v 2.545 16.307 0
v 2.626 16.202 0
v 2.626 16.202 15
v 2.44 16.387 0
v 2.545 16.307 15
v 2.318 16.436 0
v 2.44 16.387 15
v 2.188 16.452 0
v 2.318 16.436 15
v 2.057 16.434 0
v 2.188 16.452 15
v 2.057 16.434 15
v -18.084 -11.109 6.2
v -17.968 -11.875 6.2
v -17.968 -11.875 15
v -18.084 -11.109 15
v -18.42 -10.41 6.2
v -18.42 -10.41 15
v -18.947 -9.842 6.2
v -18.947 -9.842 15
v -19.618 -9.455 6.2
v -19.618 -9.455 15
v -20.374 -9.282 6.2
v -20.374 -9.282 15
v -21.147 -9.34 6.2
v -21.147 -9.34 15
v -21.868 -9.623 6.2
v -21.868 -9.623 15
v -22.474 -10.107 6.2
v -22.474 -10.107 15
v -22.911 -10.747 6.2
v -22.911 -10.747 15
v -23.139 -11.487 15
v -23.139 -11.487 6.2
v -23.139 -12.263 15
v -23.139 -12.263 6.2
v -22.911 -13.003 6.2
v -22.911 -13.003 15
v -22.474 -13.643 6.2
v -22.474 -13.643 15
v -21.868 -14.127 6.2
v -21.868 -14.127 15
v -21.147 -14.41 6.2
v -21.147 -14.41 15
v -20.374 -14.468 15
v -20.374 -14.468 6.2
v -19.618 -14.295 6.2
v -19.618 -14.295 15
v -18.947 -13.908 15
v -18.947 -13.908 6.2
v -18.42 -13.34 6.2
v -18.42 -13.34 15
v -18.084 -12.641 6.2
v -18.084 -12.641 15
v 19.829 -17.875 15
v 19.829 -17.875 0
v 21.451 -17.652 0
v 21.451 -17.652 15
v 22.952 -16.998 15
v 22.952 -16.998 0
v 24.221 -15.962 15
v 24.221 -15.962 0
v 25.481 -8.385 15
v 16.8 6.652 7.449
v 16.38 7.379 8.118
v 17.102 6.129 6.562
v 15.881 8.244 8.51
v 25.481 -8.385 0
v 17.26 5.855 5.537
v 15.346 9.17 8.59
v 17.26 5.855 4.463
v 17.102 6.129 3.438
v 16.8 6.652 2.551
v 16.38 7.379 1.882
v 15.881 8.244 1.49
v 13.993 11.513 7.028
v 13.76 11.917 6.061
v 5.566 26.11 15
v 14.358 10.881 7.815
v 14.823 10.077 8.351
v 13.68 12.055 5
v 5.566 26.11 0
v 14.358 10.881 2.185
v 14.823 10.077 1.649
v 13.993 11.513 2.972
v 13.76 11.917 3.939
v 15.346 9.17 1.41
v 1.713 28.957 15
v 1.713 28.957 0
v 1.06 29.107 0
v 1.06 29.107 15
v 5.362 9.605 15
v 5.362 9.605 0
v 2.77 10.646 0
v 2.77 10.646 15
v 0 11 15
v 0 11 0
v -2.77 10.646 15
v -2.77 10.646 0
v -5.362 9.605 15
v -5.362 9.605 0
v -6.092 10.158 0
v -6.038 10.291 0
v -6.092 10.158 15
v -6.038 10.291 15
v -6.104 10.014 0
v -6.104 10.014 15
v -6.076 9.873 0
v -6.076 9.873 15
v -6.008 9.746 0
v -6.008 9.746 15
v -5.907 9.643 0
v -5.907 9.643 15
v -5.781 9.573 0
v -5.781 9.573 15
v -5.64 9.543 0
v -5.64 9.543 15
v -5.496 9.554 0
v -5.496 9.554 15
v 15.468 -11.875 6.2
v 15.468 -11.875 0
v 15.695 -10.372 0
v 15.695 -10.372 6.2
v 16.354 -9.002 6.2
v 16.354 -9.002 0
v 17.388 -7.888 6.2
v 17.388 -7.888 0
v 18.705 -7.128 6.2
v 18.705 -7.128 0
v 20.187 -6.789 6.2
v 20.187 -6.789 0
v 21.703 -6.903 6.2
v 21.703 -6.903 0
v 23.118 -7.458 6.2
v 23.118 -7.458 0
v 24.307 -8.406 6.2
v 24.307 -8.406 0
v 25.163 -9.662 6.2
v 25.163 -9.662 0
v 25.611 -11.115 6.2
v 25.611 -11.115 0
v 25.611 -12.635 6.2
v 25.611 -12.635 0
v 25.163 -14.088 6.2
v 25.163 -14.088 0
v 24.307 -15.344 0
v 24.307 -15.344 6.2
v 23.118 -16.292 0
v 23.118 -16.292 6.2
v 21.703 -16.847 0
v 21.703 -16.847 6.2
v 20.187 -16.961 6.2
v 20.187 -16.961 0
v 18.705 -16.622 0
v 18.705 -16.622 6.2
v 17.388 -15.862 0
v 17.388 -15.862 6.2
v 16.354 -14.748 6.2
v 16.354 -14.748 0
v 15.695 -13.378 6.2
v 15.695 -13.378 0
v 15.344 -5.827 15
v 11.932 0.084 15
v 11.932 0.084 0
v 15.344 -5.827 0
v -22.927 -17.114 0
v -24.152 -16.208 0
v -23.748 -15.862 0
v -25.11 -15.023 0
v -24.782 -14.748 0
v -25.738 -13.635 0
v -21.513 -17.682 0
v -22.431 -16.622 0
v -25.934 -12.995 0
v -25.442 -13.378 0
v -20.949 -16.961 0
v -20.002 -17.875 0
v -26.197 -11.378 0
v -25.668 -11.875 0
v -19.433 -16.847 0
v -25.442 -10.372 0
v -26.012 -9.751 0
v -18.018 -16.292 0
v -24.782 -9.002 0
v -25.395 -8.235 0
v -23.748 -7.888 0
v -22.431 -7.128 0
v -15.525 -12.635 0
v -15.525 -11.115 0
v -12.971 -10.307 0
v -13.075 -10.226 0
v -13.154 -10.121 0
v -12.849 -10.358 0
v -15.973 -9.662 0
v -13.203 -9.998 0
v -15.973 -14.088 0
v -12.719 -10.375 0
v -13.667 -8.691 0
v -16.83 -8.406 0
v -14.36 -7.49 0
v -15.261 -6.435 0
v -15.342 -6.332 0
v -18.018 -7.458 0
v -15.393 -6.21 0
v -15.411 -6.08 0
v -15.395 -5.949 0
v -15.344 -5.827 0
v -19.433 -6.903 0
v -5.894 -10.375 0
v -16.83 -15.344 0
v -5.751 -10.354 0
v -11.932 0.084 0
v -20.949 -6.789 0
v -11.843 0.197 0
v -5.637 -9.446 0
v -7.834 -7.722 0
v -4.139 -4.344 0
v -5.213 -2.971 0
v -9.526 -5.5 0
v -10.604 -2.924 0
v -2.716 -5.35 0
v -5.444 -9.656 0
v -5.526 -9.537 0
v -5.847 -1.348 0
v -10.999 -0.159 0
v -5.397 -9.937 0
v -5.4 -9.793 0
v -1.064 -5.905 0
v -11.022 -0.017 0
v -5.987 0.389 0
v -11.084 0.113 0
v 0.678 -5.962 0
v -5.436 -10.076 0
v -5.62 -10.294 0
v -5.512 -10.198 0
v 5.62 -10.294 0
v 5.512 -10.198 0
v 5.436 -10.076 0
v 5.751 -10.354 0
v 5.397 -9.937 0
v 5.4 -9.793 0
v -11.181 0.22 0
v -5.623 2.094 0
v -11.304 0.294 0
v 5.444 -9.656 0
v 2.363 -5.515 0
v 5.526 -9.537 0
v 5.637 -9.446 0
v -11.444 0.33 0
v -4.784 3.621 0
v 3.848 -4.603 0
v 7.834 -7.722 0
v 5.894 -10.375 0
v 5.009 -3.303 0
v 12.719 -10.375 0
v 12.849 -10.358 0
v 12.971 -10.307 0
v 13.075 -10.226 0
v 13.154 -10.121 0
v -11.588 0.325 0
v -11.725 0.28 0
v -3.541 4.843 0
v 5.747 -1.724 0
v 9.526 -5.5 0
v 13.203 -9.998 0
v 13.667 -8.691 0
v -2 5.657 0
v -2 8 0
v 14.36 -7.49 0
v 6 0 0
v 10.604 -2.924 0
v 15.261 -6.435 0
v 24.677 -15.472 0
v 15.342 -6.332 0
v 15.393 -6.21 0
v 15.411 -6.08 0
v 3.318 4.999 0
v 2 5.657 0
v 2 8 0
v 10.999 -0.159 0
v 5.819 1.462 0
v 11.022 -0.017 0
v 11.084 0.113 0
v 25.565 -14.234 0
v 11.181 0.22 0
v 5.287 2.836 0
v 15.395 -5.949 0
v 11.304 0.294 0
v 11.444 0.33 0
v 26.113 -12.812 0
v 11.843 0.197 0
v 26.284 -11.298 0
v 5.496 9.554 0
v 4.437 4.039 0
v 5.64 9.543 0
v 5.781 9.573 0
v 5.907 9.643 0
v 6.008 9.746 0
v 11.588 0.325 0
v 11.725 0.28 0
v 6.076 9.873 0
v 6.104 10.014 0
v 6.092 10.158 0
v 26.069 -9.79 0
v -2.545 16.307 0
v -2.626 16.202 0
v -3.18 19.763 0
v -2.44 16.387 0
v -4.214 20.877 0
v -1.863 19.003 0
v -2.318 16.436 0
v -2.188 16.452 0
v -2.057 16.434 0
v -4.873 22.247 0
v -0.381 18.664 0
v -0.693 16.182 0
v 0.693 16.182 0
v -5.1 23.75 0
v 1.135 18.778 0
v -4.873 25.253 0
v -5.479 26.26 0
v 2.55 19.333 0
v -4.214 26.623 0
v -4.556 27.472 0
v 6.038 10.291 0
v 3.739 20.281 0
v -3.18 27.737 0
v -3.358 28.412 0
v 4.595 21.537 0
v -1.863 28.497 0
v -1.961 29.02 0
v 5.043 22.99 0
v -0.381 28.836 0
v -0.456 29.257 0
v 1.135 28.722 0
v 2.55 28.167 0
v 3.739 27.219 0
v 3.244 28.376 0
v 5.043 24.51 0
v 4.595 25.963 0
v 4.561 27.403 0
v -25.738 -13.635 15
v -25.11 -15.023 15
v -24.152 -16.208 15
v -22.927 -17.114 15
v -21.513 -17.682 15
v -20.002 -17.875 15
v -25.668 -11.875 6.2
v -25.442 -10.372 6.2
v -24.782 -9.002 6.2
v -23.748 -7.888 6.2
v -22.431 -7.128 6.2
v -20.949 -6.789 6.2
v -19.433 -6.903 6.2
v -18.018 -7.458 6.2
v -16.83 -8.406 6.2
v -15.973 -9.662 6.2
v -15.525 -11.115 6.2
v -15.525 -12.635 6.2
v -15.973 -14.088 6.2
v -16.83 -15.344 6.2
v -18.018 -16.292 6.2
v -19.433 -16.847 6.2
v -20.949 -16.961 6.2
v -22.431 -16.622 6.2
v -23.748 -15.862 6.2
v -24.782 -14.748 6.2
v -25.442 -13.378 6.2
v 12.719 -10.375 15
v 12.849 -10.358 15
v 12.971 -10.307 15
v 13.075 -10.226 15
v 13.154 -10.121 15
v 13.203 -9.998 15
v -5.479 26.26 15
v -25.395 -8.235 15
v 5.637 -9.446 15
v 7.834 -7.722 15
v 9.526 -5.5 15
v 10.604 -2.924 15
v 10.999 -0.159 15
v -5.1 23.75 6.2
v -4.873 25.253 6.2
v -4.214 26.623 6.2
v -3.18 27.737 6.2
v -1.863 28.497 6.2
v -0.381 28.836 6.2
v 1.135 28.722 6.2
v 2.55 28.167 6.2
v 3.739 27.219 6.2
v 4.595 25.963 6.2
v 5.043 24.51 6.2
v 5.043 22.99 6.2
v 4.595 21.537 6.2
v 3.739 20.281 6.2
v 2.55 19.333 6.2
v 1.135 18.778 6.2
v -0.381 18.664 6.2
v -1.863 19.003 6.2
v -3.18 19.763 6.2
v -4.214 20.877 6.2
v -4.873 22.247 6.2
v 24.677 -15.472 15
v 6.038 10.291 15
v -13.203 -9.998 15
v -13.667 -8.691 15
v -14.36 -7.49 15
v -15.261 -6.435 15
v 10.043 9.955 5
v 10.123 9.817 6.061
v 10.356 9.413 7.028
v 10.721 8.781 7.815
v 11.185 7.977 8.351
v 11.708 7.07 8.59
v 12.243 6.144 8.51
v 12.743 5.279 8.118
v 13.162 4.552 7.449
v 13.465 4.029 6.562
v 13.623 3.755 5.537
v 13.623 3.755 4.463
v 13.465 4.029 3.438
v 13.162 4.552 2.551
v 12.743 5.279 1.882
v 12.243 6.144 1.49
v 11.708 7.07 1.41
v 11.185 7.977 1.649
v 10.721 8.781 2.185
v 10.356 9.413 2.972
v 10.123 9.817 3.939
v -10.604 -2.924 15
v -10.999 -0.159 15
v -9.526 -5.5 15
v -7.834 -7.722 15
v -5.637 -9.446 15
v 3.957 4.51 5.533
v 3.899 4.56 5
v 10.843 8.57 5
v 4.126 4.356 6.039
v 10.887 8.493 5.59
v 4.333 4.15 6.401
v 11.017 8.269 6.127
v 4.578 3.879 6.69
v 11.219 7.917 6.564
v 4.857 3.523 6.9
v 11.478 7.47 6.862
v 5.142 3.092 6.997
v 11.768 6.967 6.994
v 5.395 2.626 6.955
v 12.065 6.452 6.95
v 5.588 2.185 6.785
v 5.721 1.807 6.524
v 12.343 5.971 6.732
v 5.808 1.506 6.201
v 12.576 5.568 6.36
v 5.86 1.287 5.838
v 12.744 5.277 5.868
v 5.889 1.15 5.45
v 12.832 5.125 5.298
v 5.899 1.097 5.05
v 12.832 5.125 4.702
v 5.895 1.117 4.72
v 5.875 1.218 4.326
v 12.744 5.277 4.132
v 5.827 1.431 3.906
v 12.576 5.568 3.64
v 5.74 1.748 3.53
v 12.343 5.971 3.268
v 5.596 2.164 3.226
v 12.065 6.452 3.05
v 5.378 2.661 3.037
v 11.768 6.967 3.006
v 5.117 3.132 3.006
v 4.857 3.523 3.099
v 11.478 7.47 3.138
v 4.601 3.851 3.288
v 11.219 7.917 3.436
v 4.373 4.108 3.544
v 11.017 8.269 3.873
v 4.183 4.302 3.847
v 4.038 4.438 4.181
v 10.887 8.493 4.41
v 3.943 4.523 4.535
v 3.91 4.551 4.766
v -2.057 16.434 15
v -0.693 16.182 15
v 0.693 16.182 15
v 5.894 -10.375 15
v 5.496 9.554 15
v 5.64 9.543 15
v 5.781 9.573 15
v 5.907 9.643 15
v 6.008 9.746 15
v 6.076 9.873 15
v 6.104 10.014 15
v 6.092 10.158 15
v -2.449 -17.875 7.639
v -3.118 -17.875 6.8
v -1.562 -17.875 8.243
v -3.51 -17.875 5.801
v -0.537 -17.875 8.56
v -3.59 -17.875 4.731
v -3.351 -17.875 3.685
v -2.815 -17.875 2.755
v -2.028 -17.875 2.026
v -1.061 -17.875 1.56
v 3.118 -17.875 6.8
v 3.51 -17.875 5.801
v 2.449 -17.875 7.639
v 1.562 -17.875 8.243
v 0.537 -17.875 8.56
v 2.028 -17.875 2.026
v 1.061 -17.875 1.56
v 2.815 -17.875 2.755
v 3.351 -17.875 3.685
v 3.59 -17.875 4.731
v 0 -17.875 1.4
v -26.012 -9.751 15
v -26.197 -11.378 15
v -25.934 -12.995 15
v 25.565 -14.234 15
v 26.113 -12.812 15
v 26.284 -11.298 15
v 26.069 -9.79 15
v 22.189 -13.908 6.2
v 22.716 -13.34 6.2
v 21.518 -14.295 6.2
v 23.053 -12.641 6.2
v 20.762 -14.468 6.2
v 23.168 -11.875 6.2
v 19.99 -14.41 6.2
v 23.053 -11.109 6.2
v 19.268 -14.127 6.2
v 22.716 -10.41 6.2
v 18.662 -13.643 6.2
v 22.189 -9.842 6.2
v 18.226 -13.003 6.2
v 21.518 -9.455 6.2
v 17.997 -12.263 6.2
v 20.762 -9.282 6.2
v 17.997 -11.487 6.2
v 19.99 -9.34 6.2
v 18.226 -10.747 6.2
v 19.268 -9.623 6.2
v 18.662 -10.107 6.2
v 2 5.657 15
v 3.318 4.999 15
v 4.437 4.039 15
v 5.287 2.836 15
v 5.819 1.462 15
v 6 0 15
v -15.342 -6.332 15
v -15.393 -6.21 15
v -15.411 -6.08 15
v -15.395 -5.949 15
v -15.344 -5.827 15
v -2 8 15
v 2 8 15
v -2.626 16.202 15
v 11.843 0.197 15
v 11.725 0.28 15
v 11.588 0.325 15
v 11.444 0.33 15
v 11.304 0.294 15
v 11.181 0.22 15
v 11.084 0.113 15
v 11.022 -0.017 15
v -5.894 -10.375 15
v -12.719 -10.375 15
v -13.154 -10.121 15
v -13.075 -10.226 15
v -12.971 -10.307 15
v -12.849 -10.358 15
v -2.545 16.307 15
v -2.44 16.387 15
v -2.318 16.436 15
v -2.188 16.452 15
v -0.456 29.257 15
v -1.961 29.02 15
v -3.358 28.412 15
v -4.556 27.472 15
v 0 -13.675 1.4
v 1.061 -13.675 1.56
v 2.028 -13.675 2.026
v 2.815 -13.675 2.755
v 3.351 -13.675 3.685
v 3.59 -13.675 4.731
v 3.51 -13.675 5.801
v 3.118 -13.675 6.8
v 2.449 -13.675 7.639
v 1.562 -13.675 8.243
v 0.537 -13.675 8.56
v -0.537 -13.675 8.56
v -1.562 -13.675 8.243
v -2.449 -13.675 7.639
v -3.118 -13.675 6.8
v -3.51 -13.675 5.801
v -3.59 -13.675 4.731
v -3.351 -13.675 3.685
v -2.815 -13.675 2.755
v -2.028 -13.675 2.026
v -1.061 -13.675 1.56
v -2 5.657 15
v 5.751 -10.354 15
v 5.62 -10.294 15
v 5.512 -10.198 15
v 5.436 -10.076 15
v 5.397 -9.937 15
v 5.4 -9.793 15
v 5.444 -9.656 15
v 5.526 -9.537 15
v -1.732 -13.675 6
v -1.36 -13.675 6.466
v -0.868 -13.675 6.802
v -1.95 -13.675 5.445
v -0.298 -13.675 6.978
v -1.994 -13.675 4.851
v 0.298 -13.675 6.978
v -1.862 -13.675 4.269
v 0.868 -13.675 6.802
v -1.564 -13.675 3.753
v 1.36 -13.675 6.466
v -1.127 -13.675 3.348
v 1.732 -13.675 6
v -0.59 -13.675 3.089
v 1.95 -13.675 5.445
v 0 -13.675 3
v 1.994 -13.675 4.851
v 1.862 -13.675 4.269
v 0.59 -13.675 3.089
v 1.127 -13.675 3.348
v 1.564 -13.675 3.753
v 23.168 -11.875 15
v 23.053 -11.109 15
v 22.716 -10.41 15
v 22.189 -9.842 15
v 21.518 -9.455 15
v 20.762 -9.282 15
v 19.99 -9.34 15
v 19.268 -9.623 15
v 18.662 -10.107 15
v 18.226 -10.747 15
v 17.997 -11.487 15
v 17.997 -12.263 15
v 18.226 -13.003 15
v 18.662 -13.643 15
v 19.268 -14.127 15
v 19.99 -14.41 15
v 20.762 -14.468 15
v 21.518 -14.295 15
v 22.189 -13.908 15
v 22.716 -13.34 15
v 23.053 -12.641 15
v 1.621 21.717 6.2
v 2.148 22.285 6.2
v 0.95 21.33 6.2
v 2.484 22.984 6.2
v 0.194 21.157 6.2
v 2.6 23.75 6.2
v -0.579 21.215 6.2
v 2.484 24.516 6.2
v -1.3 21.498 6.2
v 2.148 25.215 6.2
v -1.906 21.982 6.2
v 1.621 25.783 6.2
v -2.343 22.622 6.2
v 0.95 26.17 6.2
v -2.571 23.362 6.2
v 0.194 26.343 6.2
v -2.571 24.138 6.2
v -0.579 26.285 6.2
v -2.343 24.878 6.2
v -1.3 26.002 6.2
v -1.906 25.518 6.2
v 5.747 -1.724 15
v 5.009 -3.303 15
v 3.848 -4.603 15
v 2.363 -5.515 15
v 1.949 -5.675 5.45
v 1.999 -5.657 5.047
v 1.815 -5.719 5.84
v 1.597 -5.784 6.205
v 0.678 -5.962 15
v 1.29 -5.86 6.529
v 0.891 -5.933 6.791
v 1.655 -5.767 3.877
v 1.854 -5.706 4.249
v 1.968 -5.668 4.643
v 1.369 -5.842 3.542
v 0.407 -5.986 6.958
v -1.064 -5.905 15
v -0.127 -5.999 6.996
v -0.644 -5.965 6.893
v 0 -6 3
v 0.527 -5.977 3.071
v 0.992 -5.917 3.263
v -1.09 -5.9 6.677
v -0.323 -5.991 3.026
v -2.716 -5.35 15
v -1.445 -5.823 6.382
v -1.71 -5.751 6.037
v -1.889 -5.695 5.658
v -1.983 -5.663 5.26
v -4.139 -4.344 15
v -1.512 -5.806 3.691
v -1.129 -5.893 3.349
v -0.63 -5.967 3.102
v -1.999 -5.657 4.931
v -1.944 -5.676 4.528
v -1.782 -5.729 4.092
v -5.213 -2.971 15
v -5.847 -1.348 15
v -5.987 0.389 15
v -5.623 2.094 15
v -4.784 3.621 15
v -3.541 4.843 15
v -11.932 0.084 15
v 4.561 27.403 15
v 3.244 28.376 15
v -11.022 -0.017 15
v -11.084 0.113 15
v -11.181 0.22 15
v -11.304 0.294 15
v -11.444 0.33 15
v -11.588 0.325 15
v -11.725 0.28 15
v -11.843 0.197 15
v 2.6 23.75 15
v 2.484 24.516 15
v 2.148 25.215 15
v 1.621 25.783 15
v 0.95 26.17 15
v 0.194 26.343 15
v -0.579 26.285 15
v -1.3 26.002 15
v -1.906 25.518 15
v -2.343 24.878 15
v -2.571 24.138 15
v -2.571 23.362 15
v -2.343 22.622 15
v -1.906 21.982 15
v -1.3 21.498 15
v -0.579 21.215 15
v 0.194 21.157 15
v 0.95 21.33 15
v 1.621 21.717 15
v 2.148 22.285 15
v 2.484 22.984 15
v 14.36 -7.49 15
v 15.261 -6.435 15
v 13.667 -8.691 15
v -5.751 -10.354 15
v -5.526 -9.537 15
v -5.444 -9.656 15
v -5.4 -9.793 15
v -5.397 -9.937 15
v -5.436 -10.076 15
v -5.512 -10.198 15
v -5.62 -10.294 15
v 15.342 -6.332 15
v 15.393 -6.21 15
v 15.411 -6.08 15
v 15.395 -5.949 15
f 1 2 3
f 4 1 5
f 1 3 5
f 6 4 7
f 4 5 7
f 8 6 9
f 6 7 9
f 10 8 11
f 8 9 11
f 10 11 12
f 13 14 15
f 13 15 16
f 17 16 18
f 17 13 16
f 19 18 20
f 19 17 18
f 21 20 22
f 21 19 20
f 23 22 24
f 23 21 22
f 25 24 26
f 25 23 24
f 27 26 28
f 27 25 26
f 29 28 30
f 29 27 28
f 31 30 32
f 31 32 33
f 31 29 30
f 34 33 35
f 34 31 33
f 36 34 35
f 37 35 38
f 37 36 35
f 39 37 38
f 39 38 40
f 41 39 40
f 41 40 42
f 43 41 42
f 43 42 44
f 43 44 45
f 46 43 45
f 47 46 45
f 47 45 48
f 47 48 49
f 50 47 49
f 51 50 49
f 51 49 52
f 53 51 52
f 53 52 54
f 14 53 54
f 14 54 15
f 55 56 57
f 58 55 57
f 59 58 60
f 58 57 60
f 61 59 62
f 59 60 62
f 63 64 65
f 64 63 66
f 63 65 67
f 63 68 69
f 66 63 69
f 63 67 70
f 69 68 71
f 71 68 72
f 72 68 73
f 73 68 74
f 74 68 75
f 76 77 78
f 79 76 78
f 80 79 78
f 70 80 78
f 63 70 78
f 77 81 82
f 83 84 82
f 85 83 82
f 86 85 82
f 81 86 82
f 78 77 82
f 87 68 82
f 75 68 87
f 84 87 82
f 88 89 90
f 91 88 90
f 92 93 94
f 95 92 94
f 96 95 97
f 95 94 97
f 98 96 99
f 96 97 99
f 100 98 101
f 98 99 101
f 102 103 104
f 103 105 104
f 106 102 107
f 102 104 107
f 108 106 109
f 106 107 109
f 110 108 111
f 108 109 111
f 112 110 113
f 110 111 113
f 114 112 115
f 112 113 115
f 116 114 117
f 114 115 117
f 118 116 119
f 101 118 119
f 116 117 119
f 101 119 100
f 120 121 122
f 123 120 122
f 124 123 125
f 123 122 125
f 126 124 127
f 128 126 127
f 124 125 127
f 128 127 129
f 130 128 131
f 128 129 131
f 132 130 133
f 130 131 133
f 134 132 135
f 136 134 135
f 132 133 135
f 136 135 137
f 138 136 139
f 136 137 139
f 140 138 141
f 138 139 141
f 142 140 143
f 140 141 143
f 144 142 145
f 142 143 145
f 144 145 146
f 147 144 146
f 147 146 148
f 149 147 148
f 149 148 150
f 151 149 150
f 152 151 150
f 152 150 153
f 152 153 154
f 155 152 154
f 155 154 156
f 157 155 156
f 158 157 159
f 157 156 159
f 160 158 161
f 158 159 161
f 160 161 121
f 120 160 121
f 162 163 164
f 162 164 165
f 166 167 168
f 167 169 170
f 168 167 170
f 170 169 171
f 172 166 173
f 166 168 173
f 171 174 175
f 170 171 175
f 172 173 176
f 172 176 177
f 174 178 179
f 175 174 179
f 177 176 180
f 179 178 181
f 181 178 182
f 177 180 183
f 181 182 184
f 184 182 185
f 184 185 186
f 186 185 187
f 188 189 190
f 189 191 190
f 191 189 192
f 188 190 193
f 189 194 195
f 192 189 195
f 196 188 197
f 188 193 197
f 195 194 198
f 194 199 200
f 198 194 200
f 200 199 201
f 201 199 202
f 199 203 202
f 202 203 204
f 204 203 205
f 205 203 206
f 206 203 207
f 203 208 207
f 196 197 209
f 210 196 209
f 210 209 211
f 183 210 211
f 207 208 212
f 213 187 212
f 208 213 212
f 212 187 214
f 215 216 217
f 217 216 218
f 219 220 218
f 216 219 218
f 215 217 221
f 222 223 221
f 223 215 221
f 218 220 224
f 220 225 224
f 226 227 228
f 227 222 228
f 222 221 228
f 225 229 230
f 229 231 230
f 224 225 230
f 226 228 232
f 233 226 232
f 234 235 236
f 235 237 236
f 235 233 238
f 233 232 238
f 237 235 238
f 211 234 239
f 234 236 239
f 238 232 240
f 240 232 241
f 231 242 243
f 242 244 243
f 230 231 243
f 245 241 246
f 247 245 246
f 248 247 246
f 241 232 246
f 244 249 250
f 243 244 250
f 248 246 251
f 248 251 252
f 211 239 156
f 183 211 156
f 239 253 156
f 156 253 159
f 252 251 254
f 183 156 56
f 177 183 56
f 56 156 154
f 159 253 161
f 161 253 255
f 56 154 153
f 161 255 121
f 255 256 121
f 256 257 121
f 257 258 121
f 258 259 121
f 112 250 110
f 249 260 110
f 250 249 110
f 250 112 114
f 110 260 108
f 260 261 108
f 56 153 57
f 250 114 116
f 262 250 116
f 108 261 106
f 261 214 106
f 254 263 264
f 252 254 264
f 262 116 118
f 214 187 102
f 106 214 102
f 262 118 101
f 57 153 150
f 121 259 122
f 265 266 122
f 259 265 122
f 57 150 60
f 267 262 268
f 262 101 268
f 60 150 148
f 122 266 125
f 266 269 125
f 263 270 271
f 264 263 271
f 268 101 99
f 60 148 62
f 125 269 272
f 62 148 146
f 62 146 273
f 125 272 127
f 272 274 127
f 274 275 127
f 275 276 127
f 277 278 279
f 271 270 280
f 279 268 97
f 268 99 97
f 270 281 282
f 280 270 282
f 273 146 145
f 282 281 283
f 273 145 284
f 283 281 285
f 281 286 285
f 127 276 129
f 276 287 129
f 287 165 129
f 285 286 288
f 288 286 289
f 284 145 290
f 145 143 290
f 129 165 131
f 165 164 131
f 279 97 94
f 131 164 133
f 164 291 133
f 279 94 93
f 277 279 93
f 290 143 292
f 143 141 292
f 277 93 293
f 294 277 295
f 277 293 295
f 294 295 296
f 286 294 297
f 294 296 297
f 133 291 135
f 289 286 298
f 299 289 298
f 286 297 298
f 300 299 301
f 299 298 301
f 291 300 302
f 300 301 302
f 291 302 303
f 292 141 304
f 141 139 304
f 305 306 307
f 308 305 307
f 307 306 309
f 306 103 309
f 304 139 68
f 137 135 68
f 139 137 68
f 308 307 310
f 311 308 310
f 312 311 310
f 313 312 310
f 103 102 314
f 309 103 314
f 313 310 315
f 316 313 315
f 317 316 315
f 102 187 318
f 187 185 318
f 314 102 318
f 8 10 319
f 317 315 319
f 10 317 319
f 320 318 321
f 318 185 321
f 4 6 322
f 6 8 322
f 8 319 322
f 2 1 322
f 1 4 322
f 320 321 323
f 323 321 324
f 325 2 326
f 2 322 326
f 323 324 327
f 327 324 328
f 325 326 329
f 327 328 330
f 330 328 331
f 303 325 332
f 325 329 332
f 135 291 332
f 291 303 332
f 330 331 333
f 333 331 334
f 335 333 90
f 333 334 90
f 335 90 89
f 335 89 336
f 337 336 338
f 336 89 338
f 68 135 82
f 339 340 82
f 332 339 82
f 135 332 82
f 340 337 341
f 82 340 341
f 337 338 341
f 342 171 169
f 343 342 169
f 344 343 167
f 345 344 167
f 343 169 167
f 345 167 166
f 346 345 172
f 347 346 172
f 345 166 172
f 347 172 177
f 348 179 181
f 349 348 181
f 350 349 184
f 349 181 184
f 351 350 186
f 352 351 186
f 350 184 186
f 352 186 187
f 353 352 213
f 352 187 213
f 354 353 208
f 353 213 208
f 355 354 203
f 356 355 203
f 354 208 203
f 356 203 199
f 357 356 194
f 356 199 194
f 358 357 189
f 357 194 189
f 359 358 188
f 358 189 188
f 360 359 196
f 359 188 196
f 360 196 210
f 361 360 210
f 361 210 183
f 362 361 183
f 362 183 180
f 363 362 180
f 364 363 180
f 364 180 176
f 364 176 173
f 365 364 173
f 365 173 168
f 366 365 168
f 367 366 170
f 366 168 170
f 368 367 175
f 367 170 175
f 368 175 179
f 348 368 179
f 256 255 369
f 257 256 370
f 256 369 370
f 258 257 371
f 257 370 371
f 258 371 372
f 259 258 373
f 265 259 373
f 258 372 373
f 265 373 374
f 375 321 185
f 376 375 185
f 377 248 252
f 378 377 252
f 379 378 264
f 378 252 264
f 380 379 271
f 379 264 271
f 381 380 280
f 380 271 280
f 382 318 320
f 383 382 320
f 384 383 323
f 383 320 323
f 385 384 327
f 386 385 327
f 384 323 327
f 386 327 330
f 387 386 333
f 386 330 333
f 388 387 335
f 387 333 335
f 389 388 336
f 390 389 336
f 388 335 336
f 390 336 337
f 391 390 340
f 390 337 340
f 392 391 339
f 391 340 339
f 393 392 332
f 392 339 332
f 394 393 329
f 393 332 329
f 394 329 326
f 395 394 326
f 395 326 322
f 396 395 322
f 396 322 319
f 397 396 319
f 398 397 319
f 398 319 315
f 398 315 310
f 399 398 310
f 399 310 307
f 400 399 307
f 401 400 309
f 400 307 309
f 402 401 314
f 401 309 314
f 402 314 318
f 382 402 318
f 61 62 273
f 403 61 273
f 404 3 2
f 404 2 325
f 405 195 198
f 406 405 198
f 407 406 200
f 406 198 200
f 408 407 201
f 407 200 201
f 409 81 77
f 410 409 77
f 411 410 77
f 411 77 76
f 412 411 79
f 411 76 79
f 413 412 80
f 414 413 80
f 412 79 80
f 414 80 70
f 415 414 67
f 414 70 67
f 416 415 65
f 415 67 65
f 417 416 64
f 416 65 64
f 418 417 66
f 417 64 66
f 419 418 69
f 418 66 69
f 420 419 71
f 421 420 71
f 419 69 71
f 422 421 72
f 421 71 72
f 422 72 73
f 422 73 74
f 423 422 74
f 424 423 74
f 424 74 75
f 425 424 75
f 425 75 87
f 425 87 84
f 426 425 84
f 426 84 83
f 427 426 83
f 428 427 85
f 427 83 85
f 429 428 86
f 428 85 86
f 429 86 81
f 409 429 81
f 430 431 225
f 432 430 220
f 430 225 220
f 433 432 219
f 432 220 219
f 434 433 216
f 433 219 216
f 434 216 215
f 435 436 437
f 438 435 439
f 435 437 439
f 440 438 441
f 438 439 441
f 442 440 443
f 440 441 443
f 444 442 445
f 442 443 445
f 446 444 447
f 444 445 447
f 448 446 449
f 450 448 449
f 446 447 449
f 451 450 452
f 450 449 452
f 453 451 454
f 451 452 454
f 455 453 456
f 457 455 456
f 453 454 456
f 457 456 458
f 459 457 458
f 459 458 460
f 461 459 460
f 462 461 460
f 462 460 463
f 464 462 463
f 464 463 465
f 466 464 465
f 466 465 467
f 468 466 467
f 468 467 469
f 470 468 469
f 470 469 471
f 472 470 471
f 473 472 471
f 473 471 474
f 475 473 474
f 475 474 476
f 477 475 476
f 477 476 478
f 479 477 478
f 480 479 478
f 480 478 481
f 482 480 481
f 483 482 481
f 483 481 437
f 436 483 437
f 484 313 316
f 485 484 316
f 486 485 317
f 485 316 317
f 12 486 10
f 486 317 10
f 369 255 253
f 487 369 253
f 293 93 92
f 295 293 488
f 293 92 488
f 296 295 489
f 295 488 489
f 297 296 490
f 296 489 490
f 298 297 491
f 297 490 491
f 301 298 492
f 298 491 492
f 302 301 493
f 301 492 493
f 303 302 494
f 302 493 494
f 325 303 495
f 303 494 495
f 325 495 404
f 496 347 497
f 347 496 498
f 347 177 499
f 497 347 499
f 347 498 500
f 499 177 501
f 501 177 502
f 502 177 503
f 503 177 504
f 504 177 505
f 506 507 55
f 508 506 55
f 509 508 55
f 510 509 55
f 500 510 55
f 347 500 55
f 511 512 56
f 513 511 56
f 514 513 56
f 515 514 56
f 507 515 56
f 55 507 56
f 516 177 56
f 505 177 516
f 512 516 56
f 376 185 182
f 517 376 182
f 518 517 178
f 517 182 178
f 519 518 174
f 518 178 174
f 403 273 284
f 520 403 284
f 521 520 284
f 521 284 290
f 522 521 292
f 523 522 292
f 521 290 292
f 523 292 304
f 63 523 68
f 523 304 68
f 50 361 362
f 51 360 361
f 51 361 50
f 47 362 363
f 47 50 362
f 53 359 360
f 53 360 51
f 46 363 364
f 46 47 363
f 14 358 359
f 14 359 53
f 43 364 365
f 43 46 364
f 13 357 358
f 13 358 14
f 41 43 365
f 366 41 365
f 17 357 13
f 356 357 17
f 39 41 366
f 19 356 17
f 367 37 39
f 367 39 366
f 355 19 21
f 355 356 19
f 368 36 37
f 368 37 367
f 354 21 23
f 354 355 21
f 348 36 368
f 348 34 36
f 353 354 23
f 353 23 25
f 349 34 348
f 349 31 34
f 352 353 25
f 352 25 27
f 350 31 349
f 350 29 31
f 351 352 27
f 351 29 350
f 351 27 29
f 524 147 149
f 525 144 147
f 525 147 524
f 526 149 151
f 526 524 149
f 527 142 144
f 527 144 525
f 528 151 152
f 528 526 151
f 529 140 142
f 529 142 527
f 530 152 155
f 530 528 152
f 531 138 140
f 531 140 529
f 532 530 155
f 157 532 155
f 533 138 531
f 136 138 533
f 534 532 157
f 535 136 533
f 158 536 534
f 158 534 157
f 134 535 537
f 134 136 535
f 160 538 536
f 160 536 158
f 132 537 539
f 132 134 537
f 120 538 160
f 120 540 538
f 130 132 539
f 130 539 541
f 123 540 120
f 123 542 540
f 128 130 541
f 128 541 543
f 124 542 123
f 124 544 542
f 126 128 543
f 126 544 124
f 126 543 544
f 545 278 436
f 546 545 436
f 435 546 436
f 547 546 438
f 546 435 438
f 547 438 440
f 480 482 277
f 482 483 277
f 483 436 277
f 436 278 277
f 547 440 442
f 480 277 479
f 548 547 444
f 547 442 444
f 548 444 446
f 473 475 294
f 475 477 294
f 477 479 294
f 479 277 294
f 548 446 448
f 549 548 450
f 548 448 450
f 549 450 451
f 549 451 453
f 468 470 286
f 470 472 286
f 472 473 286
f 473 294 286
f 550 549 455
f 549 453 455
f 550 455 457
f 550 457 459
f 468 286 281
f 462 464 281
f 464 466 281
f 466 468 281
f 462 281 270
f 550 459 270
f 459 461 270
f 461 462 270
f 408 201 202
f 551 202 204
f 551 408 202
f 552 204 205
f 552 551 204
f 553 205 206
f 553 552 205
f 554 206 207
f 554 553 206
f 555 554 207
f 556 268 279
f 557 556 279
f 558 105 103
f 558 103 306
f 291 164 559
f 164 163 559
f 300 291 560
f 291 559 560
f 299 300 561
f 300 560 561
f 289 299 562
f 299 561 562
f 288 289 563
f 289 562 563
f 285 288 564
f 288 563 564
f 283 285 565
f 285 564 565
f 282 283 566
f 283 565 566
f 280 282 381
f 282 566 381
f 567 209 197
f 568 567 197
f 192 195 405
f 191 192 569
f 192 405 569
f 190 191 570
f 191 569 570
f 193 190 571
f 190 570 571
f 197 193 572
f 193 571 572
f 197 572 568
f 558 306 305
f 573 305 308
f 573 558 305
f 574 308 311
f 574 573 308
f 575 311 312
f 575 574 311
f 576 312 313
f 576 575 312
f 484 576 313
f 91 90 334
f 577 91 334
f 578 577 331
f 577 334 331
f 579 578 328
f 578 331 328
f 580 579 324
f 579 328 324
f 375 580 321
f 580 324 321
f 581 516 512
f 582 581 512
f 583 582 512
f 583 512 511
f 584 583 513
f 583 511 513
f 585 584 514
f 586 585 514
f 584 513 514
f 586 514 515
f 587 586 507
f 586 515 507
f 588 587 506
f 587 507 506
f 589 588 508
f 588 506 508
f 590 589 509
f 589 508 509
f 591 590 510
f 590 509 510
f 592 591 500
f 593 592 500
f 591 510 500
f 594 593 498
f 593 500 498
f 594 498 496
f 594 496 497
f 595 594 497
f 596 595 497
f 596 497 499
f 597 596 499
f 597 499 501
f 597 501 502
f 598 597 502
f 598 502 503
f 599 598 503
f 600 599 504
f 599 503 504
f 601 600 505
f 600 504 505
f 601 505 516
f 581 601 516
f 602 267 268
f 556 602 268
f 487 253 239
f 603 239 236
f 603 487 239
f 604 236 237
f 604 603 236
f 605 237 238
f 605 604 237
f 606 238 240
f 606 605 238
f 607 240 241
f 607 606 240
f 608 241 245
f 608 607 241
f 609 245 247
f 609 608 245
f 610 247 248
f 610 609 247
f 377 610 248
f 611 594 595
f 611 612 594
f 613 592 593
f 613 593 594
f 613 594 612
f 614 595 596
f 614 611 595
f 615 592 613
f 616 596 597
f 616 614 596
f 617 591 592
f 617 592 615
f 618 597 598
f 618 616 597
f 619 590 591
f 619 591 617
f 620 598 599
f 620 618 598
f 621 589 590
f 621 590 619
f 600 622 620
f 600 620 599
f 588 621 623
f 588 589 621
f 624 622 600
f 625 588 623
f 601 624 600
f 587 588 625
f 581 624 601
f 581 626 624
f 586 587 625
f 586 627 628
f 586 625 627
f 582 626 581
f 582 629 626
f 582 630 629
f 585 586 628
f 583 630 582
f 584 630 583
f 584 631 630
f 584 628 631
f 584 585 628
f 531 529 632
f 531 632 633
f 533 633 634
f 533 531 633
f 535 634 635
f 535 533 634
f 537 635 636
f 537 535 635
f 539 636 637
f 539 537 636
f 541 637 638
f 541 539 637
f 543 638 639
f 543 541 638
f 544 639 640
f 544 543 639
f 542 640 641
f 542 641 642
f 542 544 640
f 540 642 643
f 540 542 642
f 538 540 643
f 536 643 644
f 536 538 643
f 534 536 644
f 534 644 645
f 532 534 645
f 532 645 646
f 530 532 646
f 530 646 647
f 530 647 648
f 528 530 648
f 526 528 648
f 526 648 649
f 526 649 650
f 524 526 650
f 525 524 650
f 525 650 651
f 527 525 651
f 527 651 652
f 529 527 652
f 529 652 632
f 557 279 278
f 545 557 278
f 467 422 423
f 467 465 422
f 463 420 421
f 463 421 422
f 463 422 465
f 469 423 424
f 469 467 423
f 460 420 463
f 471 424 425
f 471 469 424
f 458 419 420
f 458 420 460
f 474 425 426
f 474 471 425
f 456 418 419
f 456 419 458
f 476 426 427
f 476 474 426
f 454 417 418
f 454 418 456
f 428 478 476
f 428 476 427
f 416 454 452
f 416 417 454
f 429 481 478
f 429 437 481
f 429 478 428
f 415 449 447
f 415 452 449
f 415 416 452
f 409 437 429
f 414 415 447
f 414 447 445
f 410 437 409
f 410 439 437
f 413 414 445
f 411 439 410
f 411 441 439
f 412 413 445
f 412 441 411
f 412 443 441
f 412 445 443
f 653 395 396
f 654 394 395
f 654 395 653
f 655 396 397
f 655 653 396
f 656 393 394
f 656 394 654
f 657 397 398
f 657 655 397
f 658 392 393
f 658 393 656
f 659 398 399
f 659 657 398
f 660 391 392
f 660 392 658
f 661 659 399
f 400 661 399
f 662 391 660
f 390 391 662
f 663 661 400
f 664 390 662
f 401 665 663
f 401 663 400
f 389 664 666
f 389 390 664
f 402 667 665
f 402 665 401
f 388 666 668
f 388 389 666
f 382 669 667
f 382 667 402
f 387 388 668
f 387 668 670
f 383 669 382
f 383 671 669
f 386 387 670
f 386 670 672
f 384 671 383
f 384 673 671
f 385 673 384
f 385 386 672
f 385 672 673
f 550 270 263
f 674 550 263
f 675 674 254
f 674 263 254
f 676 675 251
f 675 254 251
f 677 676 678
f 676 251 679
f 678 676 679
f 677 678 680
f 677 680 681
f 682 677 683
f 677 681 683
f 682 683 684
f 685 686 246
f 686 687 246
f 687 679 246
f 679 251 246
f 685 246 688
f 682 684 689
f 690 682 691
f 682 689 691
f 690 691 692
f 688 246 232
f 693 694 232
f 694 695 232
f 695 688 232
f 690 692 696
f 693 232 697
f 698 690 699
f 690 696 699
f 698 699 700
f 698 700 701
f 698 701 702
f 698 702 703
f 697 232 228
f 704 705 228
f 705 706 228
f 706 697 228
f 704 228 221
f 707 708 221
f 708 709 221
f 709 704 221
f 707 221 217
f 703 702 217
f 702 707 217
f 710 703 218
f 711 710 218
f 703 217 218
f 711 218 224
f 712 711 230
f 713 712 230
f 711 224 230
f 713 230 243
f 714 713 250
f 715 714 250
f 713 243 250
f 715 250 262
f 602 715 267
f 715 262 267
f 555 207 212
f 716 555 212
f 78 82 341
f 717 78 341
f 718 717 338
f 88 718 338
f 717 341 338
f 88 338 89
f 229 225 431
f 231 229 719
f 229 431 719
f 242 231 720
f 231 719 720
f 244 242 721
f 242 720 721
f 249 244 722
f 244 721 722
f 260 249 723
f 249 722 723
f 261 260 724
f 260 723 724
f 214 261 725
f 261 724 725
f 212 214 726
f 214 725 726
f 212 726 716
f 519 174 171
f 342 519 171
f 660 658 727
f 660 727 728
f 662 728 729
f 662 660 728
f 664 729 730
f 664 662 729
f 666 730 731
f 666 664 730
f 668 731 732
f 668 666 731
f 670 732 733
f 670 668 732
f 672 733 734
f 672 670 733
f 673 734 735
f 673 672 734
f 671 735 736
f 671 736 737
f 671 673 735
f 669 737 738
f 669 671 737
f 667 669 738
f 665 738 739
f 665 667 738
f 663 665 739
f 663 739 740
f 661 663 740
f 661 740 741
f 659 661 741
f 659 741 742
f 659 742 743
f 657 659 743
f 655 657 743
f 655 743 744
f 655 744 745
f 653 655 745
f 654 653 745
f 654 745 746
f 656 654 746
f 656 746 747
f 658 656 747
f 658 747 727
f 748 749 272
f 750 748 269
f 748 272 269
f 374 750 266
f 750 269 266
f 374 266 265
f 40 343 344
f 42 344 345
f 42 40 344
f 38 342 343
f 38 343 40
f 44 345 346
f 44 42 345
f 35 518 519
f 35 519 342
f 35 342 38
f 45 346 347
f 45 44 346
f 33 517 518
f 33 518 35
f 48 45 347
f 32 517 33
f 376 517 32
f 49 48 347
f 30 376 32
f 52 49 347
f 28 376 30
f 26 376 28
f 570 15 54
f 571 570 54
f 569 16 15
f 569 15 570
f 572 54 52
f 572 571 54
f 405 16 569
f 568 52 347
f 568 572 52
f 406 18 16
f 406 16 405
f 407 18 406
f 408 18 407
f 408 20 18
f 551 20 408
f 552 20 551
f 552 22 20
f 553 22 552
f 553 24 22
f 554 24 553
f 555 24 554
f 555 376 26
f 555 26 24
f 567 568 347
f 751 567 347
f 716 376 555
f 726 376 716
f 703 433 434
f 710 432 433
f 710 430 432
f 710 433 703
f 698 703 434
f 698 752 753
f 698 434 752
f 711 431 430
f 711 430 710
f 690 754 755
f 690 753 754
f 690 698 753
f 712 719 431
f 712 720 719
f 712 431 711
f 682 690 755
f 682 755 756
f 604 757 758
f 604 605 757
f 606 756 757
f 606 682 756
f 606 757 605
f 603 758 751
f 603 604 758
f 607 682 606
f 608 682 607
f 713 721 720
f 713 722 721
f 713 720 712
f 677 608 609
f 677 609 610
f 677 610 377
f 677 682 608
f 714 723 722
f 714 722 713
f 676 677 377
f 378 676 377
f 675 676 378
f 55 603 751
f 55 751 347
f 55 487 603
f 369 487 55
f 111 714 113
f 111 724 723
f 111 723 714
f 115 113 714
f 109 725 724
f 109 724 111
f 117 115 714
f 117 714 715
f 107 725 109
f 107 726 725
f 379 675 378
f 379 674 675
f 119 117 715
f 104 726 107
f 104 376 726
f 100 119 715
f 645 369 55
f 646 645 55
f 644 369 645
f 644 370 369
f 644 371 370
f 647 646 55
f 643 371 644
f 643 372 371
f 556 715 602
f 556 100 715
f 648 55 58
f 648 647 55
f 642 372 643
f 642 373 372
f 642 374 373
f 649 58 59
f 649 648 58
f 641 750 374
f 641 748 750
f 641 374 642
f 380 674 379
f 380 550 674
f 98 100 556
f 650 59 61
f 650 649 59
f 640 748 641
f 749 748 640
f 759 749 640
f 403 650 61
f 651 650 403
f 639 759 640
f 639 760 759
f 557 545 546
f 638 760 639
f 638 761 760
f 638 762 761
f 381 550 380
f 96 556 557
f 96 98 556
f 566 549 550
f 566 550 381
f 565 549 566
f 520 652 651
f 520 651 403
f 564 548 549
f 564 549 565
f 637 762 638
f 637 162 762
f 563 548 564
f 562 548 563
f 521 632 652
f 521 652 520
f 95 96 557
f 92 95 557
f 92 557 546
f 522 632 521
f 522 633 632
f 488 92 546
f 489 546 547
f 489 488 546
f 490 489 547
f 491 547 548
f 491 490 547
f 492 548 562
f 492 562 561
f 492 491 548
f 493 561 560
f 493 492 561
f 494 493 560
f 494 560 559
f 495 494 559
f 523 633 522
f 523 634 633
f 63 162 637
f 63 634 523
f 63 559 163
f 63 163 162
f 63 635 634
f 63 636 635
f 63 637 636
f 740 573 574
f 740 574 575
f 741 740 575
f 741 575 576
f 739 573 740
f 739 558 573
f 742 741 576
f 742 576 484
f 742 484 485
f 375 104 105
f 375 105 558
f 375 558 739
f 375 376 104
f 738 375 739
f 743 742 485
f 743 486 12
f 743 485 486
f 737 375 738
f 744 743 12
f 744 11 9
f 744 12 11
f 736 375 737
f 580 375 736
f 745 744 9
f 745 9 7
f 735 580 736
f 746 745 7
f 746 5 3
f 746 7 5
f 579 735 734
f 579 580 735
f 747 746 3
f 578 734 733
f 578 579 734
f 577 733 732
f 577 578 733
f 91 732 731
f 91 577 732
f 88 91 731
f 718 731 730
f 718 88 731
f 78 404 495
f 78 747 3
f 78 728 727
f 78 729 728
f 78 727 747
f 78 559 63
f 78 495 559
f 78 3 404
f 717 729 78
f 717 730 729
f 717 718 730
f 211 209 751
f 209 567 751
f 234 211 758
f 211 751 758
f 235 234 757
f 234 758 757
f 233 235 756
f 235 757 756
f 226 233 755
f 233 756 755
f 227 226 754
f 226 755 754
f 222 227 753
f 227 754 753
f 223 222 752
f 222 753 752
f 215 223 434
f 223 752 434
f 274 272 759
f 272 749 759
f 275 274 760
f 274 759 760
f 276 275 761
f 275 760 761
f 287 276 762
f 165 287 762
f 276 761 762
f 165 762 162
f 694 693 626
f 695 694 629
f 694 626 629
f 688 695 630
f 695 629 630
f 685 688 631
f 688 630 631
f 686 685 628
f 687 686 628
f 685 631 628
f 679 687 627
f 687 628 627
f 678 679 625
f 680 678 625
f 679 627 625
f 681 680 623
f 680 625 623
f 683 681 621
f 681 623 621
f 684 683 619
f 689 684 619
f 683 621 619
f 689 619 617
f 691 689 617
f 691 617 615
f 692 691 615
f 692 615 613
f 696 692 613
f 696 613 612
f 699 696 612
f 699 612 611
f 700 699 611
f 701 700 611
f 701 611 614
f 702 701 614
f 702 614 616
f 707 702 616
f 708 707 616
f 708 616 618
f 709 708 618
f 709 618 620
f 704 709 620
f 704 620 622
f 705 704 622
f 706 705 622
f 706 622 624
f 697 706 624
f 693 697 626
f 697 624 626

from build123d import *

# Parameters (mm, degrees)
SKETCH_1_R               = 2.6
EXTRUDE_1_DEPTH          = 15
CUT_EXTRUDE_1_REACH      = 58.014
CUT_EXTRUDE_1_END_RADIUS = 6
SKETCH_3_R               = 2
SKETCH_4_R               = 3.6
CUT_EXTRUDE_2_DEPTH      = 4.2
SKETCH_6_R               = 5.1
CUT_EXTRUDE_4_DEPTH      = 6.2
CUT_EXTRUDE_5_REACH      = 53.779
CUT_EXTRUDE_5_END_RADIUS = 6
SKETCH_7_R               = 2
SKETCH_8_R               = 3.6
CUT_EXTRUDE_6_DEPTH      = 4.2
CUT_EXTRUDE_7_DEPTH      = 43.095434039
FILLET_1_R               = 0.5


with BuildPart() as part:
    # ｽｹｯﾁ1 → ﾎﾞｽ - 押し出し1 (new body)
    with BuildSketch(Plane.XY):
        with BuildLine():
            ThreePointArc((1.060449829, 29.107252287), (-2.678502383, 28.760723475), (-5.479274058, 26.259618943))
            Line((-5.479274058, 26.259618943), (-25.394531587, -8.234618943))
            ThreePointArc((-25.394531587, -8.234618943), (-26.160165812, -10.558527256), (-25.934363924, -12.994868595))
            Line((-25.934363924, -12.994868595), (-25.737844829, -13.635249652))
            ThreePointArc((-25.737844829, -13.635249652), (-23.56826597, -16.700012845), (-20.00186007, -17.875))
            Line((-20.00186007, -17.875), (19.828654989, -17.875))
            ThreePointArc((19.828654989, -17.875), (22.224035736, -17.376104532), (24.221068284, -15.962383691))
            Line((24.221068284, -15.962383691), (24.677395, -15.472002635))
            ThreePointArc((24.677395, -15.472002635), (26.246768352, -12.06071063), (25.481134127, -8.384618943))
            Line((25.481134127, -8.384618943), (5.565876598, 26.109618943))
            ThreePointArc((5.565876598, 26.109618943), (3.936130075, 27.934631788), (1.713295639, 28.957252287))
            Line((1.713295639, 28.957252287), (1.060449829, 29.107252287))
        make_face()
        with Locations((-20.56810334, -11.875)):
            Circle(SKETCH_1_R, mode=Mode.SUBTRACT)
        with BuildLine():
            ThreePointArc((6, 0), (-3.464101615, -4.898979486), (-2, 5.656854249))
            Line((-2, 5.656854249), (-2, 8))
            Line((-2, 8), (2, 8))
            Line((2, 8), (2, 5.656854249))
            ThreePointArc((2, 5.656854249), (4.898979486, 3.464101615), (6, 0))
        make_face(mode=Mode.SUBTRACT)
        with Locations((20.56810334, -11.875)):
            Circle(SKETCH_1_R, mode=Mode.SUBTRACT)
        with Locations((0, 23.75)):
            Circle(SKETCH_1_R, mode=Mode.SUBTRACT)
    extrude(amount=EXTRUDE_1_DEPTH)

    # ｶｯﾄ - 押し出し1: up to this cylinder (the profile starts outside it)
    cut_extrude_1_end = Plane(origin=(0, 0, 5), z_dir=(0, 0, -1)) * Cylinder(CUT_EXTRUDE_1_END_RADIUS, 129.028, mode=Mode.PRIVATE)
    # ｽｹｯﾁ3 → ｶｯﾄ - 押し出し1 (cut, up to the surface)
    with BuildSketch(Plane.XZ.offset(17.875), mode=Mode.PRIVATE) as cut_extrude_1_sk1:
        with Locations(Location((0, 5, 0), (0, 0, 270))):
            Circle(SKETCH_3_R)
    cut_extrude_1_tool1 = extrude(cut_extrude_1_sk1.sketch, amount=-CUT_EXTRUDE_1_REACH, mode=Mode.PRIVATE) - cut_extrude_1_end
    add(cut_extrude_1_tool1.solids().sort_by_distance((0, -17.875, 5))[0], mode=Mode.SUBTRACT)

    # ｽｹｯﾁ4 → ｶｯﾄ - 押し出し2 (cut)
    with BuildSketch(Plane.XZ.offset(17.875)):
        with Locations(Location((0, 5, 0), (0, 0, 270))):
            Circle(SKETCH_4_R)
    extrude(amount=-CUT_EXTRUDE_2_DEPTH, mode=Mode.SUBTRACT)

    # ｽｹｯﾁ6 → ｶｯﾄ - 押し出し4 (cut)
    with BuildSketch(Plane(origin=(0, 0, 0), x_dir=(-1, 0, 0), z_dir=(0, 0, -1))):
        with Locations((0, 23.75)):
            Circle(SKETCH_6_R)
        with Locations((-20.56810334, -11.875)):
            Circle(SKETCH_6_R)
        with Locations((20.56810334, -11.875)):
            Circle(SKETCH_6_R)
    extrude(amount=-CUT_EXTRUDE_4_DEPTH, mode=Mode.SUBTRACT)

    # ｶｯﾄ - 押し出し5: up to this cylinder (the profile starts outside it)
    cut_extrude_5_end = Plane(origin=(0, 0, 5), z_dir=(0, 0, -1)) * Cylinder(CUT_EXTRUDE_5_END_RADIUS, 120.558, mode=Mode.PRIVATE)
    # ｽｹｯﾁ7 → ｶｯﾄ - 押し出し5 (cut, up to the surface)
    with BuildSketch(Plane(origin=(15.480204093, 8.9375, 0), x_dir=(0, 0, -1), z_dir=(0.8660254037844386, 0.5000000000000001, 0)), mode=Mode.PRIVATE) as cut_extrude_5_sk1:
        with Locations(Location((-5, 0, 0), (0, 0, 90))):
            Circle(SKETCH_7_R)
    cut_extrude_5_tool1 = extrude(cut_extrude_5_sk1.sketch, amount=-CUT_EXTRUDE_5_REACH, mode=Mode.PRIVATE) - cut_extrude_5_end
    add(cut_extrude_5_tool1.solids().sort_by_distance((15.480204, 8.9375, 5))[0], mode=Mode.SUBTRACT)

    # ｽｹｯﾁ8 → ｶｯﾄ - 押し出し6 (cut)
    with BuildSketch(Plane(origin=(15.480204093, 8.9375, 0), x_dir=(0, 0, -1), z_dir=(0.8660254037844386, 0.5000000000000001, 0))):
        with Locations(Location((-5, 0, 0), (0, 0, 90))):
            Circle(SKETCH_8_R)
    extrude(amount=-CUT_EXTRUDE_6_DEPTH, mode=Mode.SUBTRACT)

    # ｽｹｯﾁ9 → ｶｯﾄ - 押し出し7 (cut, through all)
    with BuildSketch(Plane(origin=(0, 0, 0), x_dir=(-1, 0, 0), z_dir=(0, 0, -1))):
        with BuildLine():
            ThreePointArc((2.426213564, 16.547674838), (0, 16.15), (-2.426213564, 16.547674838))
            Line((-2.426213564, 16.547674838), (-7.157489625, 8.352864316))
            ThreePointArc((-7.157489625, 8.352864316), (0, 11), (7.157489625, 8.352864316))
            Line((7.157489625, 8.352864316), (2.426213564, 16.547674838))
        make_face()
        with BuildLine():
            ThreePointArc((-3.655047879, -10.375), (-9.526279442, -5.5), (-10.812537504, 2.022135684))
            Line((-10.812537504, 2.022135684), (-15.543813565, -6.172674838))
            ThreePointArc((-15.543813565, -6.172674838), (-13.986310271, -8.075), (-13.117600001, -10.375))
            Line((-13.117600001, -10.375), (-3.655047879, -10.375))
        make_face()
        with BuildLine():
            Line((15.543813565, -6.172674838), (10.812537504, 2.022135684))
            ThreePointArc((10.812537504, 2.022135684), (9.526279442, -5.5), (3.655047879, -10.375))
            Line((3.655047879, -10.375), (13.117600001, -10.375))
            ThreePointArc((13.117600001, -10.375), (13.986310271, -8.075), (15.543813565, -6.172674838))
        make_face()
    extrude(amount=-CUT_EXTRUDE_7_DEPTH, mode=Mode.SUBTRACT)

    # ﾌｨﾚｯﾄ1
    fillet_1_edges = [part.edges().sort_by_distance(p)[0] for p in [
        (13.117600001, -10.375, 7.5),
        (15.543813565, -6.172674838, 7.5),
        (10.812537504, 2.022135684, 7.5),
        (3.655047879, -10.375, 7.5),
        (2.426213564, 16.547674838, 7.5),
        (-2.426213564, 16.547674838, 7.5),
        (-7.157489625, 8.352864316, 7.5),
        (7.157489625, 8.352864316, 7.5),
        (-15.543813565, -6.172674838, 7.5),
        (-13.117600001, -10.375, 7.5),
        (-3.655047879, -10.375, 7.5),
        (-10.812537504, 2.022135684, 7.5),
    ]]
    fillet(fillet_1_edges, radius=FILLET_1_R)


solid = part.part
